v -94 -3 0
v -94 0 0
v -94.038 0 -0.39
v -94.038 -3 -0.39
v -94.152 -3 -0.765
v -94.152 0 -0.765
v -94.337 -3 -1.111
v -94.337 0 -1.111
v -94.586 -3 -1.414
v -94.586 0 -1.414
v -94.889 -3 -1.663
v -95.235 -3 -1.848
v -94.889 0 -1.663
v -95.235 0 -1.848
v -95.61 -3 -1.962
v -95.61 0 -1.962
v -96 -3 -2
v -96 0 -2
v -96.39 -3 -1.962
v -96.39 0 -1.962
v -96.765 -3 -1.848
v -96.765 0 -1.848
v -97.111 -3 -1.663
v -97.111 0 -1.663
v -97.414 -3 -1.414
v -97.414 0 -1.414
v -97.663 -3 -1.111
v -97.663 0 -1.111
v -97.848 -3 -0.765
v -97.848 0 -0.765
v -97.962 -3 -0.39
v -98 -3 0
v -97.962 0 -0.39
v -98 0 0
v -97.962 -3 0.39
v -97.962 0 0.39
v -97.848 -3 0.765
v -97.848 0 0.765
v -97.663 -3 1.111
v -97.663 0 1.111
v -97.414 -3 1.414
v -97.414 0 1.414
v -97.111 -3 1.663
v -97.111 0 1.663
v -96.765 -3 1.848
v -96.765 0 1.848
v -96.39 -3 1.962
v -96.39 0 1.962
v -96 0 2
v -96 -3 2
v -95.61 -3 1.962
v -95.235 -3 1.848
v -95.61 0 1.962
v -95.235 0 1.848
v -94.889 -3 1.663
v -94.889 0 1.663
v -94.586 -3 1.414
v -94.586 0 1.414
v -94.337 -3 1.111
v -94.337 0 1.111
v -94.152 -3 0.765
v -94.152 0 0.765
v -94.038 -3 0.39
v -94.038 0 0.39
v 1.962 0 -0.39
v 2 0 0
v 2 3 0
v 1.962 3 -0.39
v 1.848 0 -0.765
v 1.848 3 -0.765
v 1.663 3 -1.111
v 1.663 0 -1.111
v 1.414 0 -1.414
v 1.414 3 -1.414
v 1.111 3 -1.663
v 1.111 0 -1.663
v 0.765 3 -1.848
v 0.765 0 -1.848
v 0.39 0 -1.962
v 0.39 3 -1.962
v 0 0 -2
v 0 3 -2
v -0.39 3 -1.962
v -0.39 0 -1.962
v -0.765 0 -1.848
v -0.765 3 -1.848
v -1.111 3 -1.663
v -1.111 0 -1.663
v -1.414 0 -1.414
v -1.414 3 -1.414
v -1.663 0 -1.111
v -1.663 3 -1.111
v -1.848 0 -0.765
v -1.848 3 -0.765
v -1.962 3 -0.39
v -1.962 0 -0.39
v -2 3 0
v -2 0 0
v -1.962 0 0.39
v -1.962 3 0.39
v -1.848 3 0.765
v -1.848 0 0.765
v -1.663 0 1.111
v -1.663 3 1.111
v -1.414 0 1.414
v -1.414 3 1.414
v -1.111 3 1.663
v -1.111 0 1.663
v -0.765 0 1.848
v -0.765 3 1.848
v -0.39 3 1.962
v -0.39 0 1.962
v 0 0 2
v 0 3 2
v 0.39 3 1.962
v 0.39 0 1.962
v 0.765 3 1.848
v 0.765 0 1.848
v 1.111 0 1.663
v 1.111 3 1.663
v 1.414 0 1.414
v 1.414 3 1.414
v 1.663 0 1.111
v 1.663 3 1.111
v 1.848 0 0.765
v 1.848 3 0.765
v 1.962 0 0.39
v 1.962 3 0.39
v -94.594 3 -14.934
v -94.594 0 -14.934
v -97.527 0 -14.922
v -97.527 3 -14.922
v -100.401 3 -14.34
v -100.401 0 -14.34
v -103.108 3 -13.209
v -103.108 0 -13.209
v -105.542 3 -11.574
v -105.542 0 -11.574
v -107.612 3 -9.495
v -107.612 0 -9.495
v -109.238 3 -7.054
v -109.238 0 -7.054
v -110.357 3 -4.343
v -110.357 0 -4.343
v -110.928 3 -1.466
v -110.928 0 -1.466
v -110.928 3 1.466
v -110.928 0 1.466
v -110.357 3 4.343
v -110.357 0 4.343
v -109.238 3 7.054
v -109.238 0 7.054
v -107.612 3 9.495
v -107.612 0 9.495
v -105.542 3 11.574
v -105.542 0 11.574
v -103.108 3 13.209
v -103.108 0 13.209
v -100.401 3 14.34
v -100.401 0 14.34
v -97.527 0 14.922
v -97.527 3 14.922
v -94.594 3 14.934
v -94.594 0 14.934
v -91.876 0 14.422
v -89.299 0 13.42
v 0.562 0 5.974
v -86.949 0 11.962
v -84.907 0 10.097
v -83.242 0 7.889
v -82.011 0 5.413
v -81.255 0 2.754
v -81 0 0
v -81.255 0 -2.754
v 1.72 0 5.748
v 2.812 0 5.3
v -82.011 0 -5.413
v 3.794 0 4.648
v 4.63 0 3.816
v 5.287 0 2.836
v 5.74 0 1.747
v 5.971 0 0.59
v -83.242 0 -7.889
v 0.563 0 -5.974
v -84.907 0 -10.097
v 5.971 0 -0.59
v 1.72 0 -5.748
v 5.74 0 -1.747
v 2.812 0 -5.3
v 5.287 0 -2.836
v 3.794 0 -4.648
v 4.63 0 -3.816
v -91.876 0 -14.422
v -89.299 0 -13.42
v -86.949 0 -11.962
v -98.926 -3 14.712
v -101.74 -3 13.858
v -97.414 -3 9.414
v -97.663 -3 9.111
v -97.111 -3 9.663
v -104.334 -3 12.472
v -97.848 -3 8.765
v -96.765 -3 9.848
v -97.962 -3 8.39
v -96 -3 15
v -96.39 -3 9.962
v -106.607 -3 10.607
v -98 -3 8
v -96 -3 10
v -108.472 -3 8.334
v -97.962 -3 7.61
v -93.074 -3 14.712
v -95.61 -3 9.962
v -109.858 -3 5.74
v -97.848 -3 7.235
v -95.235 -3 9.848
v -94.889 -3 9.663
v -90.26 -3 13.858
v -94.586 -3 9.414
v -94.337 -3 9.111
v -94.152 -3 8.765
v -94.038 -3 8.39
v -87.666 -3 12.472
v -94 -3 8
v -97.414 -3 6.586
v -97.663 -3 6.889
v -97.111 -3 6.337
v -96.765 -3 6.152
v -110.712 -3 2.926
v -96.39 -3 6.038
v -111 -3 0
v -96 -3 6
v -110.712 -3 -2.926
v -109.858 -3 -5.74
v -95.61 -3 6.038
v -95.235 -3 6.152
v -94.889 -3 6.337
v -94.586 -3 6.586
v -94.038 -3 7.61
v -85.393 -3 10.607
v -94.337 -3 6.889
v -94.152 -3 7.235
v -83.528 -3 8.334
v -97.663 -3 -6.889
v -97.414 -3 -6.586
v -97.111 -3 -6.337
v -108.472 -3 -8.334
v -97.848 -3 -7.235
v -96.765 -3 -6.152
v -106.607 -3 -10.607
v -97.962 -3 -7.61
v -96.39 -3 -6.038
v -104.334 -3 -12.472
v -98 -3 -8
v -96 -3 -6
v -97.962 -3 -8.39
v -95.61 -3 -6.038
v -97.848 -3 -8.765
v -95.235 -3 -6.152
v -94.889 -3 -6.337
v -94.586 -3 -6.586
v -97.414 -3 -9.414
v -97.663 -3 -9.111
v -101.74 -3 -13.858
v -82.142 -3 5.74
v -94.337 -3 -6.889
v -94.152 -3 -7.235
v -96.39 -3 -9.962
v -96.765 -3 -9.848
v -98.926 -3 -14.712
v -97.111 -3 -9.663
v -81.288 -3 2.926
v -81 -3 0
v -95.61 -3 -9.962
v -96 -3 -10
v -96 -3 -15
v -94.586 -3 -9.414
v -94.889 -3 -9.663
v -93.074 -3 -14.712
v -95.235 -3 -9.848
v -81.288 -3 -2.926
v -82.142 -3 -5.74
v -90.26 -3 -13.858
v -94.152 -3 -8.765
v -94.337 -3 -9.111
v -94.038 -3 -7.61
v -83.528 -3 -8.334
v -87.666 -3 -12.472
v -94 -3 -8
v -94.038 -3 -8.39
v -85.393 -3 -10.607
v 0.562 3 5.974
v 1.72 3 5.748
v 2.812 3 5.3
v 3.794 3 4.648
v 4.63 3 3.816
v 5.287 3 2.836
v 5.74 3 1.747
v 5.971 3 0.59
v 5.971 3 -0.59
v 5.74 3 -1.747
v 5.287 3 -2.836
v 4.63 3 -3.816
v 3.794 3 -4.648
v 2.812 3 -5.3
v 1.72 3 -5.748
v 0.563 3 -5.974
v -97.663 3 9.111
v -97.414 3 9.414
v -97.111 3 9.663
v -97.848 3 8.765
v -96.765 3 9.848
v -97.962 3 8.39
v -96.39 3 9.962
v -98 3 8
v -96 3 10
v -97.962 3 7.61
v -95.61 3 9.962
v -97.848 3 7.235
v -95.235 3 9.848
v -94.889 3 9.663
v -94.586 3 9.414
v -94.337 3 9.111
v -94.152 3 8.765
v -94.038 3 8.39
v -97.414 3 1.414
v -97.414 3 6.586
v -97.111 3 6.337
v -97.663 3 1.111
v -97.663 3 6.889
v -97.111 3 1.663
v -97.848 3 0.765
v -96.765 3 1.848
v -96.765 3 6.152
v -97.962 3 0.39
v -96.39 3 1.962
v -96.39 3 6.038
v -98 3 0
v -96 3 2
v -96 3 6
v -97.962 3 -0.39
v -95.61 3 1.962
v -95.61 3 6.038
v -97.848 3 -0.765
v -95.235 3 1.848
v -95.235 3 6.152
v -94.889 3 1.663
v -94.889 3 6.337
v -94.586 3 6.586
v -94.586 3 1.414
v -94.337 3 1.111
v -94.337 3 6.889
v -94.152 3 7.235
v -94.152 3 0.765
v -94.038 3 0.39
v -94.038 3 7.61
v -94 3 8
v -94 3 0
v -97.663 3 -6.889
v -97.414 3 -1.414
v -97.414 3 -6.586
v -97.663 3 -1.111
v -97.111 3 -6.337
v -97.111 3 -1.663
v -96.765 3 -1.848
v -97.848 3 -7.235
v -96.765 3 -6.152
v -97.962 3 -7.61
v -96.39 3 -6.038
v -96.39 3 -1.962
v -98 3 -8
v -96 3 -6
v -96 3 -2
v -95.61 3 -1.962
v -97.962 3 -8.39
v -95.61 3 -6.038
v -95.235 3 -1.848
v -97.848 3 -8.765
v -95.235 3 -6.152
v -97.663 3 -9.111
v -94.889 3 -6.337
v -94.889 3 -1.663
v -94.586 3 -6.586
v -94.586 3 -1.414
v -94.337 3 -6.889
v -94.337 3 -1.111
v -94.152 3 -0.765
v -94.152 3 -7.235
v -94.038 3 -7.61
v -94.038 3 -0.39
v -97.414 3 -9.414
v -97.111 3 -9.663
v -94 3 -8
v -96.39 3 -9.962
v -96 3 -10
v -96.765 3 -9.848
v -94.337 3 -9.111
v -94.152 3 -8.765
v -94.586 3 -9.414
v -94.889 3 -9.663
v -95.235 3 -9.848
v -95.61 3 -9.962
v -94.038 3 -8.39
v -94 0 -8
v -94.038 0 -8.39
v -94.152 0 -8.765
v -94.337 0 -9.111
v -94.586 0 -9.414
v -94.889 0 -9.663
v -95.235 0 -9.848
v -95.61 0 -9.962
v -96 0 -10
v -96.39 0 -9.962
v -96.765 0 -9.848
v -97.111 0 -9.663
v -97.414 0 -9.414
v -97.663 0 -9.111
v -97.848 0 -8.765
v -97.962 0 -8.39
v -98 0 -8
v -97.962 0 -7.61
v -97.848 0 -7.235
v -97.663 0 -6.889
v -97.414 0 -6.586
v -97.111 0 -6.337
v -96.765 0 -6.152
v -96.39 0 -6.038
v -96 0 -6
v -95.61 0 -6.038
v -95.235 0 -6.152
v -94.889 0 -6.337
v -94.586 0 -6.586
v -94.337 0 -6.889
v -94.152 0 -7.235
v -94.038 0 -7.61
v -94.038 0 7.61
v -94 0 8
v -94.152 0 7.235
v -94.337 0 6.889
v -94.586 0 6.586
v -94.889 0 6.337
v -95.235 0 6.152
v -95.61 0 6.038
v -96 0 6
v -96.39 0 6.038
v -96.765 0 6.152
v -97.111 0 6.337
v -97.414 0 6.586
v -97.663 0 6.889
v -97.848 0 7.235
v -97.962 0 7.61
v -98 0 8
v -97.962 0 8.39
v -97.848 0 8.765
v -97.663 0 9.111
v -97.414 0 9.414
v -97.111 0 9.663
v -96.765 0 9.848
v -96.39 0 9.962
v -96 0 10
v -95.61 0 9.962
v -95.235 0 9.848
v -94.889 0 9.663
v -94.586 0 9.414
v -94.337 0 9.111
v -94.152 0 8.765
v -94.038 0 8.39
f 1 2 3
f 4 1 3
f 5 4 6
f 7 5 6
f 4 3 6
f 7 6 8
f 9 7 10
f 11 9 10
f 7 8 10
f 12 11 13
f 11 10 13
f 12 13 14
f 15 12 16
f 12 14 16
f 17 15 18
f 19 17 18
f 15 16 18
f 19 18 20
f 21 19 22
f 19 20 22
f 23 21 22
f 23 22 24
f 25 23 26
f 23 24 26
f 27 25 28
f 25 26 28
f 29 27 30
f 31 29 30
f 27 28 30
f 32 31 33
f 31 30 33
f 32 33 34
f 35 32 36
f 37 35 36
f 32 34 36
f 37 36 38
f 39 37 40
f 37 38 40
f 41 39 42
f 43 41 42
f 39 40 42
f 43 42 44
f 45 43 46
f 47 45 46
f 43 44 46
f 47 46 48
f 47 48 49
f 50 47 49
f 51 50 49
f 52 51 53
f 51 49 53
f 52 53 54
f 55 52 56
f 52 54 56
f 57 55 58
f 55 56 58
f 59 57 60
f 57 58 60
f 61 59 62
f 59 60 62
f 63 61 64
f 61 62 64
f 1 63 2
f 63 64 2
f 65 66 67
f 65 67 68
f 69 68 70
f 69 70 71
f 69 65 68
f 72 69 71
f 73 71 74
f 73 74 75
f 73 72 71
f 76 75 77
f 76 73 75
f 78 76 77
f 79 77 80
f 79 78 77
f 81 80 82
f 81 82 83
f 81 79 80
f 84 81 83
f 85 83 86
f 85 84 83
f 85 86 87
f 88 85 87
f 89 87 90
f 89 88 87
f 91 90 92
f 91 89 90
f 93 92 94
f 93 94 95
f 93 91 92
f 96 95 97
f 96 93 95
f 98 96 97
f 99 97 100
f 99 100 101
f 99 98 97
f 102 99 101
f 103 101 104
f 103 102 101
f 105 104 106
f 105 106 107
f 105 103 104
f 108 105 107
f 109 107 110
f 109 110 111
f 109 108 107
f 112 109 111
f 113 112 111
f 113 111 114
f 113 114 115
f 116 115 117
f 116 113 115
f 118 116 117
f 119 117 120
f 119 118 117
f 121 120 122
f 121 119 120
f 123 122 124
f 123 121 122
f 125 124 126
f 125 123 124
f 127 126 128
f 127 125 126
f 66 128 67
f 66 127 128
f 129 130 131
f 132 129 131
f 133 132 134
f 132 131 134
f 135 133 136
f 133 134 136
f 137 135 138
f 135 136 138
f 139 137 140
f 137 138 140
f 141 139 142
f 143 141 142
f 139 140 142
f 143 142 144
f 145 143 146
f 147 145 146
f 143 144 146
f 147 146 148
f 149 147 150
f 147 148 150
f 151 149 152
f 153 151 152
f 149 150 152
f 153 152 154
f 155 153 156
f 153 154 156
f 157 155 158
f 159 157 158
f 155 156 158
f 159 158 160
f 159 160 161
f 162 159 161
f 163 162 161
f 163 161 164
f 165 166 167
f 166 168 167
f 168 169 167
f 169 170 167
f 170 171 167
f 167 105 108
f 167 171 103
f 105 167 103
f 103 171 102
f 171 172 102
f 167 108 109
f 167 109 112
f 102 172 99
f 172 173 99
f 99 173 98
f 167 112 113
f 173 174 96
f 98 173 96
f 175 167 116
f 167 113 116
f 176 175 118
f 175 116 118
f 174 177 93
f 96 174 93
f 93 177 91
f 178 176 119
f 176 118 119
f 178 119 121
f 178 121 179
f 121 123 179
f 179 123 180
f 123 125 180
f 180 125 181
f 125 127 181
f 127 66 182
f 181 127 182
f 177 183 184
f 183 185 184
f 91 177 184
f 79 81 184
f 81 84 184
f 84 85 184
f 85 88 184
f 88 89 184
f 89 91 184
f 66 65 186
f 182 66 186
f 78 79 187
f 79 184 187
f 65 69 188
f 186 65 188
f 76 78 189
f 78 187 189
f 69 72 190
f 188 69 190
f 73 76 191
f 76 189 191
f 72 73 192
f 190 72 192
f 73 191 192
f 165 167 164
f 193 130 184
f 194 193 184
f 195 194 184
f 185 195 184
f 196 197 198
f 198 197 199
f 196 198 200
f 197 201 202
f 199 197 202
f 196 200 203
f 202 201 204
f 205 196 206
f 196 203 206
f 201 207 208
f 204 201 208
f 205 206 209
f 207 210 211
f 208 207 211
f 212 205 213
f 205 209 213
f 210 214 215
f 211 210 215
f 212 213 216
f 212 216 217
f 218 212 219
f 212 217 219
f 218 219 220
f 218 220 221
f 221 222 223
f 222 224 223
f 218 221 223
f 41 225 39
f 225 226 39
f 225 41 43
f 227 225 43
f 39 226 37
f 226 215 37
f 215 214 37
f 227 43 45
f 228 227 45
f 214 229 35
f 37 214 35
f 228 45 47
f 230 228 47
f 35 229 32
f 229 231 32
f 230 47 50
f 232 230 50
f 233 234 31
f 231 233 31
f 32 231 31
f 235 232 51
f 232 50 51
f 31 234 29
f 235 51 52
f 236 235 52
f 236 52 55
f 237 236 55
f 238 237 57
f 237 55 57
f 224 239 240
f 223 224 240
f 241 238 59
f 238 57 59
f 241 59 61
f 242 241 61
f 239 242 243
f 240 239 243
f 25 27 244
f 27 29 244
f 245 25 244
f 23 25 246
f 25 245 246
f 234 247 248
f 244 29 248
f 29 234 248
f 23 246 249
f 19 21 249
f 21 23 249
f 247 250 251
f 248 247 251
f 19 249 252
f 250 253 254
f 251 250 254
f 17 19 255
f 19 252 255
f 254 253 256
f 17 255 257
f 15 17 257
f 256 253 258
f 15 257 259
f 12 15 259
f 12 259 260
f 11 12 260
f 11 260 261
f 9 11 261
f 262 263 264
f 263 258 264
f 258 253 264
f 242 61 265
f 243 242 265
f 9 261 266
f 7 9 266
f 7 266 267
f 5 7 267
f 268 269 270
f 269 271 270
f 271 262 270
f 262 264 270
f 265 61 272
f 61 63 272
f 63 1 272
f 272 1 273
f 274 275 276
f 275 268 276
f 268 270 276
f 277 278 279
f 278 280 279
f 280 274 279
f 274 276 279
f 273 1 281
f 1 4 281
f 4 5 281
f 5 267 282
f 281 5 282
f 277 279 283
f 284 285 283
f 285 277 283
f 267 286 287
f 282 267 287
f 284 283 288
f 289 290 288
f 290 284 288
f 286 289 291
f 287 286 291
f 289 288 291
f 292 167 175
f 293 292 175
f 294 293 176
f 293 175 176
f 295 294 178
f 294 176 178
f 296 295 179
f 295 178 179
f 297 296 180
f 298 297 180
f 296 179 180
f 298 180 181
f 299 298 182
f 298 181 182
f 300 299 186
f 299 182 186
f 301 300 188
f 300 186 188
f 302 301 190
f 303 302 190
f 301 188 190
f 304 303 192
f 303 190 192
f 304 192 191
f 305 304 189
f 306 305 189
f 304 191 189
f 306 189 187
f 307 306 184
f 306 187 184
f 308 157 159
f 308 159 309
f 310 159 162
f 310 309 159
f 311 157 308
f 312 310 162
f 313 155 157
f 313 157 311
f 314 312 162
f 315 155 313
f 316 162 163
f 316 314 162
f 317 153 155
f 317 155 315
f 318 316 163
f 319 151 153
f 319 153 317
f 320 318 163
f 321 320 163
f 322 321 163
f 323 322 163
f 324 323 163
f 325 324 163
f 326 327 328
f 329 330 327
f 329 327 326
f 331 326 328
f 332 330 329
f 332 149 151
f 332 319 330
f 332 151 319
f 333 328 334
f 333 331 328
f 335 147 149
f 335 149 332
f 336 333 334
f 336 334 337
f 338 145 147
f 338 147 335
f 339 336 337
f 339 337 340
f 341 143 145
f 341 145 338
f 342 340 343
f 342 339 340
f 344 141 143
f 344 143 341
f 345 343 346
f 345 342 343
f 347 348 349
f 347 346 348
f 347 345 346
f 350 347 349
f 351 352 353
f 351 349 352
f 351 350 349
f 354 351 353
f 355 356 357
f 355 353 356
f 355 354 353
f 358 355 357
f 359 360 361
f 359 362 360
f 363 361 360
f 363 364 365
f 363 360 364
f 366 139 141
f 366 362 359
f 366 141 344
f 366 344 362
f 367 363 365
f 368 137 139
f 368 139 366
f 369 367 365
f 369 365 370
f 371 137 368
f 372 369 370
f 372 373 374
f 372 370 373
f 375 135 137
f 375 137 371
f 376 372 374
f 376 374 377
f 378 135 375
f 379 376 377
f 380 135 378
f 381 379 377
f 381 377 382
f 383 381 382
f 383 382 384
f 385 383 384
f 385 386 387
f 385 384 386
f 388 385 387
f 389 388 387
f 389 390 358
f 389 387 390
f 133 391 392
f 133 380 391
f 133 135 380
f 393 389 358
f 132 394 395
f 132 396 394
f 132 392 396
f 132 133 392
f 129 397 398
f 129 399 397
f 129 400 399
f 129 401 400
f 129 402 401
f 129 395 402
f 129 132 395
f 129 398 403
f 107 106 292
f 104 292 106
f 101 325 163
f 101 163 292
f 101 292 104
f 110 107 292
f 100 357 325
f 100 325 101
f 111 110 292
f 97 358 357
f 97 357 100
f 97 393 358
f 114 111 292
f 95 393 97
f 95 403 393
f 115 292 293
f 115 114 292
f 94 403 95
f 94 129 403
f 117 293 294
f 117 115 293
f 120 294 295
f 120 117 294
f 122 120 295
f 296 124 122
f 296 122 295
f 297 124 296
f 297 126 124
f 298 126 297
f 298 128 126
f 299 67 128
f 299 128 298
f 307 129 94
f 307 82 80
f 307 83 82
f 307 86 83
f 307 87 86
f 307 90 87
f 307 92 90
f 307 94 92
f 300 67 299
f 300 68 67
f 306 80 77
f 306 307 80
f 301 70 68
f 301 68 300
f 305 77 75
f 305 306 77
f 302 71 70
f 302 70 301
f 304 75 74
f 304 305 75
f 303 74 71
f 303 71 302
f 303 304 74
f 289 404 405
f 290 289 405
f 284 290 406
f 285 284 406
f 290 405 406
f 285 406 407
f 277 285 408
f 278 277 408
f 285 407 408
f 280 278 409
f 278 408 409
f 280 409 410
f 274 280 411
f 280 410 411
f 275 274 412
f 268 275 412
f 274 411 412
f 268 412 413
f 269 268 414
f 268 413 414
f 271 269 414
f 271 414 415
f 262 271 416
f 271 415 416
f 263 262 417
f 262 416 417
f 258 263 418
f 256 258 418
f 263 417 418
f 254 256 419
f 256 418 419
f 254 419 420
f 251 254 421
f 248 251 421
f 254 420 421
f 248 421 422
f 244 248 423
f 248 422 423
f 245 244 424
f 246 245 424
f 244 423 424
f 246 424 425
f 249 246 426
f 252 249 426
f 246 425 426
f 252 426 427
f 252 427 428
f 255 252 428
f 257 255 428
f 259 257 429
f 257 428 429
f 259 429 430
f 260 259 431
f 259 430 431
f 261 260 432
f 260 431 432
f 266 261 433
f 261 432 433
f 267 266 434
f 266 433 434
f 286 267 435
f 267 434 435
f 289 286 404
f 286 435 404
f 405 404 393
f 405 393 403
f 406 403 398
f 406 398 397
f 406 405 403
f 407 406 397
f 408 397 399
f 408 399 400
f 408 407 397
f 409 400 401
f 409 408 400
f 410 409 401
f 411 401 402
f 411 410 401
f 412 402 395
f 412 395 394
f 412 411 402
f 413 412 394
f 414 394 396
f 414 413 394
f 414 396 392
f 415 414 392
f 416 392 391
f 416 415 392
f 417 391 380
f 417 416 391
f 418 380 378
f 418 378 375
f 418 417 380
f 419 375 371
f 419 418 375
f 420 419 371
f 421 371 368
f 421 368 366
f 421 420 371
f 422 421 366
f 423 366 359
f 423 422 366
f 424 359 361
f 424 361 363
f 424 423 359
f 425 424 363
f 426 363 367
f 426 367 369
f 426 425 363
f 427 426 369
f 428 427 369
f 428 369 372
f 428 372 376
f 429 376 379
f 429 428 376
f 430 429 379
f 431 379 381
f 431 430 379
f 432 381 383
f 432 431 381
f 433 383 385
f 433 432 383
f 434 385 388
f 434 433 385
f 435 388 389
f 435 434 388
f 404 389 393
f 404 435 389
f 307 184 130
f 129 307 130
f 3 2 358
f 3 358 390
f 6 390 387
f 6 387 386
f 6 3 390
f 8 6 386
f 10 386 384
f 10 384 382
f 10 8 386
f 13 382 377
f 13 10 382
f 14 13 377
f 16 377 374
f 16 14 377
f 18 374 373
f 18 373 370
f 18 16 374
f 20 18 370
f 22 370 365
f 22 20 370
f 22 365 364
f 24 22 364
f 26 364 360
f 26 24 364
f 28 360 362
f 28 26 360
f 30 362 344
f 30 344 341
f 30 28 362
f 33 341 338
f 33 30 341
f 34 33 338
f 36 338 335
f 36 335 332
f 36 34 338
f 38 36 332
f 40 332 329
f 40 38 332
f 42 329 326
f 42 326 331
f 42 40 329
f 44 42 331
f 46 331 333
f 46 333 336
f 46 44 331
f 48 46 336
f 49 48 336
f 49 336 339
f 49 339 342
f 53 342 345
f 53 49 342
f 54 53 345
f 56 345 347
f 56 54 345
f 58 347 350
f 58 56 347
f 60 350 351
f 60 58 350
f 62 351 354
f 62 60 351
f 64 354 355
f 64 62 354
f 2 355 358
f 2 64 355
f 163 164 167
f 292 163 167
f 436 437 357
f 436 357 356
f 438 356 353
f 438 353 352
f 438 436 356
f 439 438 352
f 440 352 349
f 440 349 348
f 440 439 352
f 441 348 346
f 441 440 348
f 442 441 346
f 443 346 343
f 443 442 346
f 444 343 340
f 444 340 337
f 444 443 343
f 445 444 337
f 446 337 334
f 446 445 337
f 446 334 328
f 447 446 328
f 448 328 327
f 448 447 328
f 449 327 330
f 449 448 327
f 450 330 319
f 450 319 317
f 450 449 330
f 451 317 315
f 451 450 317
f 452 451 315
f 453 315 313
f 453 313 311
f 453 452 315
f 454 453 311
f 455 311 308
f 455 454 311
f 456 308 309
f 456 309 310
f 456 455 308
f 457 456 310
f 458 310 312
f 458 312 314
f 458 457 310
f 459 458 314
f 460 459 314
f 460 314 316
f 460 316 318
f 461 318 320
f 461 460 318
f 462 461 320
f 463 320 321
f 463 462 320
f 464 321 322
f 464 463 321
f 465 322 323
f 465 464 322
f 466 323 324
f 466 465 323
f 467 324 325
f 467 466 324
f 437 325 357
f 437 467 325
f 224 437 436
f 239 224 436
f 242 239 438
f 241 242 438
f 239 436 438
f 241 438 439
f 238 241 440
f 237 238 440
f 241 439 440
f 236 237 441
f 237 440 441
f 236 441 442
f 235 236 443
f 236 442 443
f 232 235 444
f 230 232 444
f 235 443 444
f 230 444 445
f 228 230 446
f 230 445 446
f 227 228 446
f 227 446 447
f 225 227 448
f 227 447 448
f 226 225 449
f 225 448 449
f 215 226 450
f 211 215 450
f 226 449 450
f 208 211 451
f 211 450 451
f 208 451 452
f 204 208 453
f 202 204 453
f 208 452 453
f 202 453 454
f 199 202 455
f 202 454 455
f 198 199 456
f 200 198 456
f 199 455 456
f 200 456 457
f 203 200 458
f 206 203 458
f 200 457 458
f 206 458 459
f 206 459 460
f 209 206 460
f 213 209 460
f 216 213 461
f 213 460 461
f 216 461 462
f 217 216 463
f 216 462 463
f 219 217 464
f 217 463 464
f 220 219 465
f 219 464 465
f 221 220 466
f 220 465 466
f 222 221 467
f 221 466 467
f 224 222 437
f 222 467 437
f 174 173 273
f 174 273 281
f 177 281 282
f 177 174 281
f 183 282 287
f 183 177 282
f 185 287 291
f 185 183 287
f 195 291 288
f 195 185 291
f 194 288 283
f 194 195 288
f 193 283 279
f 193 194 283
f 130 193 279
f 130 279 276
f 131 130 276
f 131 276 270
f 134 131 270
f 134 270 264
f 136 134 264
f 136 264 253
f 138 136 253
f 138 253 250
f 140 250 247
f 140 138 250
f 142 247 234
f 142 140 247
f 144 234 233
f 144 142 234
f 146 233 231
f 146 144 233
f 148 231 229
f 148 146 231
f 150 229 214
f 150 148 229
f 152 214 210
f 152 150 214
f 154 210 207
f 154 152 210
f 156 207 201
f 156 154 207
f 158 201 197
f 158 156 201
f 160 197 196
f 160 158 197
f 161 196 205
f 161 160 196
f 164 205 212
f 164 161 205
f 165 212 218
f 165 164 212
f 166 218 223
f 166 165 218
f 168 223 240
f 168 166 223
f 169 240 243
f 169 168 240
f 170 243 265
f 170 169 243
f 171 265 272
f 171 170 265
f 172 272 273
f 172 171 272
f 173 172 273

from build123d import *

# Parameters (mm, degrees)
SKETCH1_R           = 2
BOSS_EXTRUDE1_DEPTH = 3
BOSS_EXTRUDE2_START = -3
SKETCH1_3_R         = 2
BOSS_EXTRUDE2_DEPTH = 3


with BuildPart() as part:
    # Sketch1 → Boss-Extrude1 (new body)
    with BuildSketch(Plane(origin=(0, 0, 0), x_dir=(1, 0, 0), z_dir=(0, 1, 0))):
        with BuildLine():
            ThreePointArc((0.5625, -5.973574621), (6, 0), (0.5625, 5.973574621))
            Line((0.5625, 5.973574621), (-94.59375, 14.933936552))
            ThreePointArc((-94.59375, 14.933936552), (-111, 0), (-94.59375, -14.933936552))
            Line((-94.59375, -14.933936552), (0.5625, -5.973574621))
        make_face()
        Circle(SKETCH1_R, mode=Mode.SUBTRACT)
        with Locations((-96, 0)):
            Circle(SKETCH1_R, mode=Mode.SUBTRACT)
        with Locations((-96, 8)):
            Circle(SKETCH1_R, mode=Mode.SUBTRACT)
        with Locations((-96, -8)):
            Circle(SKETCH1_R, mode=Mode.SUBTRACT)
    extrude(amount=BOSS_EXTRUDE1_DEPTH)

    # Sketch1<3> → Boss-Extrude2 (add)
    with BuildSketch(Plane(origin=(0, 0, 0), x_dir=(1, 0, 0), z_dir=(0, 1, 0)).offset(BOSS_EXTRUDE2_START)):
        with BuildLine():
            ThreePointArc((-81, 0), (-84.907350407, 10.097184013), (-94.59375, 14.933936552))
            ThreePointArc((-94.59375, 14.933936552), (-111, 0), (-94.59375, -14.933936552))
            ThreePointArc((-94.59375, -14.933936552), (-84.907350407, -10.097184013), (-81, 0))
        make_face()
        with Locations((-96, -8)):
            Circle(SKETCH1_3_R, mode=Mode.SUBTRACT)
        with Locations((-96, 0)):
            Circle(SKETCH1_3_R, mode=Mode.SUBTRACT)
        with Locations((-96, 8)):
            Circle(SKETCH1_3_R, mode=Mode.SUBTRACT)
    extrude(amount=BOSS_EXTRUDE2_DEPTH)


solid = part.part
